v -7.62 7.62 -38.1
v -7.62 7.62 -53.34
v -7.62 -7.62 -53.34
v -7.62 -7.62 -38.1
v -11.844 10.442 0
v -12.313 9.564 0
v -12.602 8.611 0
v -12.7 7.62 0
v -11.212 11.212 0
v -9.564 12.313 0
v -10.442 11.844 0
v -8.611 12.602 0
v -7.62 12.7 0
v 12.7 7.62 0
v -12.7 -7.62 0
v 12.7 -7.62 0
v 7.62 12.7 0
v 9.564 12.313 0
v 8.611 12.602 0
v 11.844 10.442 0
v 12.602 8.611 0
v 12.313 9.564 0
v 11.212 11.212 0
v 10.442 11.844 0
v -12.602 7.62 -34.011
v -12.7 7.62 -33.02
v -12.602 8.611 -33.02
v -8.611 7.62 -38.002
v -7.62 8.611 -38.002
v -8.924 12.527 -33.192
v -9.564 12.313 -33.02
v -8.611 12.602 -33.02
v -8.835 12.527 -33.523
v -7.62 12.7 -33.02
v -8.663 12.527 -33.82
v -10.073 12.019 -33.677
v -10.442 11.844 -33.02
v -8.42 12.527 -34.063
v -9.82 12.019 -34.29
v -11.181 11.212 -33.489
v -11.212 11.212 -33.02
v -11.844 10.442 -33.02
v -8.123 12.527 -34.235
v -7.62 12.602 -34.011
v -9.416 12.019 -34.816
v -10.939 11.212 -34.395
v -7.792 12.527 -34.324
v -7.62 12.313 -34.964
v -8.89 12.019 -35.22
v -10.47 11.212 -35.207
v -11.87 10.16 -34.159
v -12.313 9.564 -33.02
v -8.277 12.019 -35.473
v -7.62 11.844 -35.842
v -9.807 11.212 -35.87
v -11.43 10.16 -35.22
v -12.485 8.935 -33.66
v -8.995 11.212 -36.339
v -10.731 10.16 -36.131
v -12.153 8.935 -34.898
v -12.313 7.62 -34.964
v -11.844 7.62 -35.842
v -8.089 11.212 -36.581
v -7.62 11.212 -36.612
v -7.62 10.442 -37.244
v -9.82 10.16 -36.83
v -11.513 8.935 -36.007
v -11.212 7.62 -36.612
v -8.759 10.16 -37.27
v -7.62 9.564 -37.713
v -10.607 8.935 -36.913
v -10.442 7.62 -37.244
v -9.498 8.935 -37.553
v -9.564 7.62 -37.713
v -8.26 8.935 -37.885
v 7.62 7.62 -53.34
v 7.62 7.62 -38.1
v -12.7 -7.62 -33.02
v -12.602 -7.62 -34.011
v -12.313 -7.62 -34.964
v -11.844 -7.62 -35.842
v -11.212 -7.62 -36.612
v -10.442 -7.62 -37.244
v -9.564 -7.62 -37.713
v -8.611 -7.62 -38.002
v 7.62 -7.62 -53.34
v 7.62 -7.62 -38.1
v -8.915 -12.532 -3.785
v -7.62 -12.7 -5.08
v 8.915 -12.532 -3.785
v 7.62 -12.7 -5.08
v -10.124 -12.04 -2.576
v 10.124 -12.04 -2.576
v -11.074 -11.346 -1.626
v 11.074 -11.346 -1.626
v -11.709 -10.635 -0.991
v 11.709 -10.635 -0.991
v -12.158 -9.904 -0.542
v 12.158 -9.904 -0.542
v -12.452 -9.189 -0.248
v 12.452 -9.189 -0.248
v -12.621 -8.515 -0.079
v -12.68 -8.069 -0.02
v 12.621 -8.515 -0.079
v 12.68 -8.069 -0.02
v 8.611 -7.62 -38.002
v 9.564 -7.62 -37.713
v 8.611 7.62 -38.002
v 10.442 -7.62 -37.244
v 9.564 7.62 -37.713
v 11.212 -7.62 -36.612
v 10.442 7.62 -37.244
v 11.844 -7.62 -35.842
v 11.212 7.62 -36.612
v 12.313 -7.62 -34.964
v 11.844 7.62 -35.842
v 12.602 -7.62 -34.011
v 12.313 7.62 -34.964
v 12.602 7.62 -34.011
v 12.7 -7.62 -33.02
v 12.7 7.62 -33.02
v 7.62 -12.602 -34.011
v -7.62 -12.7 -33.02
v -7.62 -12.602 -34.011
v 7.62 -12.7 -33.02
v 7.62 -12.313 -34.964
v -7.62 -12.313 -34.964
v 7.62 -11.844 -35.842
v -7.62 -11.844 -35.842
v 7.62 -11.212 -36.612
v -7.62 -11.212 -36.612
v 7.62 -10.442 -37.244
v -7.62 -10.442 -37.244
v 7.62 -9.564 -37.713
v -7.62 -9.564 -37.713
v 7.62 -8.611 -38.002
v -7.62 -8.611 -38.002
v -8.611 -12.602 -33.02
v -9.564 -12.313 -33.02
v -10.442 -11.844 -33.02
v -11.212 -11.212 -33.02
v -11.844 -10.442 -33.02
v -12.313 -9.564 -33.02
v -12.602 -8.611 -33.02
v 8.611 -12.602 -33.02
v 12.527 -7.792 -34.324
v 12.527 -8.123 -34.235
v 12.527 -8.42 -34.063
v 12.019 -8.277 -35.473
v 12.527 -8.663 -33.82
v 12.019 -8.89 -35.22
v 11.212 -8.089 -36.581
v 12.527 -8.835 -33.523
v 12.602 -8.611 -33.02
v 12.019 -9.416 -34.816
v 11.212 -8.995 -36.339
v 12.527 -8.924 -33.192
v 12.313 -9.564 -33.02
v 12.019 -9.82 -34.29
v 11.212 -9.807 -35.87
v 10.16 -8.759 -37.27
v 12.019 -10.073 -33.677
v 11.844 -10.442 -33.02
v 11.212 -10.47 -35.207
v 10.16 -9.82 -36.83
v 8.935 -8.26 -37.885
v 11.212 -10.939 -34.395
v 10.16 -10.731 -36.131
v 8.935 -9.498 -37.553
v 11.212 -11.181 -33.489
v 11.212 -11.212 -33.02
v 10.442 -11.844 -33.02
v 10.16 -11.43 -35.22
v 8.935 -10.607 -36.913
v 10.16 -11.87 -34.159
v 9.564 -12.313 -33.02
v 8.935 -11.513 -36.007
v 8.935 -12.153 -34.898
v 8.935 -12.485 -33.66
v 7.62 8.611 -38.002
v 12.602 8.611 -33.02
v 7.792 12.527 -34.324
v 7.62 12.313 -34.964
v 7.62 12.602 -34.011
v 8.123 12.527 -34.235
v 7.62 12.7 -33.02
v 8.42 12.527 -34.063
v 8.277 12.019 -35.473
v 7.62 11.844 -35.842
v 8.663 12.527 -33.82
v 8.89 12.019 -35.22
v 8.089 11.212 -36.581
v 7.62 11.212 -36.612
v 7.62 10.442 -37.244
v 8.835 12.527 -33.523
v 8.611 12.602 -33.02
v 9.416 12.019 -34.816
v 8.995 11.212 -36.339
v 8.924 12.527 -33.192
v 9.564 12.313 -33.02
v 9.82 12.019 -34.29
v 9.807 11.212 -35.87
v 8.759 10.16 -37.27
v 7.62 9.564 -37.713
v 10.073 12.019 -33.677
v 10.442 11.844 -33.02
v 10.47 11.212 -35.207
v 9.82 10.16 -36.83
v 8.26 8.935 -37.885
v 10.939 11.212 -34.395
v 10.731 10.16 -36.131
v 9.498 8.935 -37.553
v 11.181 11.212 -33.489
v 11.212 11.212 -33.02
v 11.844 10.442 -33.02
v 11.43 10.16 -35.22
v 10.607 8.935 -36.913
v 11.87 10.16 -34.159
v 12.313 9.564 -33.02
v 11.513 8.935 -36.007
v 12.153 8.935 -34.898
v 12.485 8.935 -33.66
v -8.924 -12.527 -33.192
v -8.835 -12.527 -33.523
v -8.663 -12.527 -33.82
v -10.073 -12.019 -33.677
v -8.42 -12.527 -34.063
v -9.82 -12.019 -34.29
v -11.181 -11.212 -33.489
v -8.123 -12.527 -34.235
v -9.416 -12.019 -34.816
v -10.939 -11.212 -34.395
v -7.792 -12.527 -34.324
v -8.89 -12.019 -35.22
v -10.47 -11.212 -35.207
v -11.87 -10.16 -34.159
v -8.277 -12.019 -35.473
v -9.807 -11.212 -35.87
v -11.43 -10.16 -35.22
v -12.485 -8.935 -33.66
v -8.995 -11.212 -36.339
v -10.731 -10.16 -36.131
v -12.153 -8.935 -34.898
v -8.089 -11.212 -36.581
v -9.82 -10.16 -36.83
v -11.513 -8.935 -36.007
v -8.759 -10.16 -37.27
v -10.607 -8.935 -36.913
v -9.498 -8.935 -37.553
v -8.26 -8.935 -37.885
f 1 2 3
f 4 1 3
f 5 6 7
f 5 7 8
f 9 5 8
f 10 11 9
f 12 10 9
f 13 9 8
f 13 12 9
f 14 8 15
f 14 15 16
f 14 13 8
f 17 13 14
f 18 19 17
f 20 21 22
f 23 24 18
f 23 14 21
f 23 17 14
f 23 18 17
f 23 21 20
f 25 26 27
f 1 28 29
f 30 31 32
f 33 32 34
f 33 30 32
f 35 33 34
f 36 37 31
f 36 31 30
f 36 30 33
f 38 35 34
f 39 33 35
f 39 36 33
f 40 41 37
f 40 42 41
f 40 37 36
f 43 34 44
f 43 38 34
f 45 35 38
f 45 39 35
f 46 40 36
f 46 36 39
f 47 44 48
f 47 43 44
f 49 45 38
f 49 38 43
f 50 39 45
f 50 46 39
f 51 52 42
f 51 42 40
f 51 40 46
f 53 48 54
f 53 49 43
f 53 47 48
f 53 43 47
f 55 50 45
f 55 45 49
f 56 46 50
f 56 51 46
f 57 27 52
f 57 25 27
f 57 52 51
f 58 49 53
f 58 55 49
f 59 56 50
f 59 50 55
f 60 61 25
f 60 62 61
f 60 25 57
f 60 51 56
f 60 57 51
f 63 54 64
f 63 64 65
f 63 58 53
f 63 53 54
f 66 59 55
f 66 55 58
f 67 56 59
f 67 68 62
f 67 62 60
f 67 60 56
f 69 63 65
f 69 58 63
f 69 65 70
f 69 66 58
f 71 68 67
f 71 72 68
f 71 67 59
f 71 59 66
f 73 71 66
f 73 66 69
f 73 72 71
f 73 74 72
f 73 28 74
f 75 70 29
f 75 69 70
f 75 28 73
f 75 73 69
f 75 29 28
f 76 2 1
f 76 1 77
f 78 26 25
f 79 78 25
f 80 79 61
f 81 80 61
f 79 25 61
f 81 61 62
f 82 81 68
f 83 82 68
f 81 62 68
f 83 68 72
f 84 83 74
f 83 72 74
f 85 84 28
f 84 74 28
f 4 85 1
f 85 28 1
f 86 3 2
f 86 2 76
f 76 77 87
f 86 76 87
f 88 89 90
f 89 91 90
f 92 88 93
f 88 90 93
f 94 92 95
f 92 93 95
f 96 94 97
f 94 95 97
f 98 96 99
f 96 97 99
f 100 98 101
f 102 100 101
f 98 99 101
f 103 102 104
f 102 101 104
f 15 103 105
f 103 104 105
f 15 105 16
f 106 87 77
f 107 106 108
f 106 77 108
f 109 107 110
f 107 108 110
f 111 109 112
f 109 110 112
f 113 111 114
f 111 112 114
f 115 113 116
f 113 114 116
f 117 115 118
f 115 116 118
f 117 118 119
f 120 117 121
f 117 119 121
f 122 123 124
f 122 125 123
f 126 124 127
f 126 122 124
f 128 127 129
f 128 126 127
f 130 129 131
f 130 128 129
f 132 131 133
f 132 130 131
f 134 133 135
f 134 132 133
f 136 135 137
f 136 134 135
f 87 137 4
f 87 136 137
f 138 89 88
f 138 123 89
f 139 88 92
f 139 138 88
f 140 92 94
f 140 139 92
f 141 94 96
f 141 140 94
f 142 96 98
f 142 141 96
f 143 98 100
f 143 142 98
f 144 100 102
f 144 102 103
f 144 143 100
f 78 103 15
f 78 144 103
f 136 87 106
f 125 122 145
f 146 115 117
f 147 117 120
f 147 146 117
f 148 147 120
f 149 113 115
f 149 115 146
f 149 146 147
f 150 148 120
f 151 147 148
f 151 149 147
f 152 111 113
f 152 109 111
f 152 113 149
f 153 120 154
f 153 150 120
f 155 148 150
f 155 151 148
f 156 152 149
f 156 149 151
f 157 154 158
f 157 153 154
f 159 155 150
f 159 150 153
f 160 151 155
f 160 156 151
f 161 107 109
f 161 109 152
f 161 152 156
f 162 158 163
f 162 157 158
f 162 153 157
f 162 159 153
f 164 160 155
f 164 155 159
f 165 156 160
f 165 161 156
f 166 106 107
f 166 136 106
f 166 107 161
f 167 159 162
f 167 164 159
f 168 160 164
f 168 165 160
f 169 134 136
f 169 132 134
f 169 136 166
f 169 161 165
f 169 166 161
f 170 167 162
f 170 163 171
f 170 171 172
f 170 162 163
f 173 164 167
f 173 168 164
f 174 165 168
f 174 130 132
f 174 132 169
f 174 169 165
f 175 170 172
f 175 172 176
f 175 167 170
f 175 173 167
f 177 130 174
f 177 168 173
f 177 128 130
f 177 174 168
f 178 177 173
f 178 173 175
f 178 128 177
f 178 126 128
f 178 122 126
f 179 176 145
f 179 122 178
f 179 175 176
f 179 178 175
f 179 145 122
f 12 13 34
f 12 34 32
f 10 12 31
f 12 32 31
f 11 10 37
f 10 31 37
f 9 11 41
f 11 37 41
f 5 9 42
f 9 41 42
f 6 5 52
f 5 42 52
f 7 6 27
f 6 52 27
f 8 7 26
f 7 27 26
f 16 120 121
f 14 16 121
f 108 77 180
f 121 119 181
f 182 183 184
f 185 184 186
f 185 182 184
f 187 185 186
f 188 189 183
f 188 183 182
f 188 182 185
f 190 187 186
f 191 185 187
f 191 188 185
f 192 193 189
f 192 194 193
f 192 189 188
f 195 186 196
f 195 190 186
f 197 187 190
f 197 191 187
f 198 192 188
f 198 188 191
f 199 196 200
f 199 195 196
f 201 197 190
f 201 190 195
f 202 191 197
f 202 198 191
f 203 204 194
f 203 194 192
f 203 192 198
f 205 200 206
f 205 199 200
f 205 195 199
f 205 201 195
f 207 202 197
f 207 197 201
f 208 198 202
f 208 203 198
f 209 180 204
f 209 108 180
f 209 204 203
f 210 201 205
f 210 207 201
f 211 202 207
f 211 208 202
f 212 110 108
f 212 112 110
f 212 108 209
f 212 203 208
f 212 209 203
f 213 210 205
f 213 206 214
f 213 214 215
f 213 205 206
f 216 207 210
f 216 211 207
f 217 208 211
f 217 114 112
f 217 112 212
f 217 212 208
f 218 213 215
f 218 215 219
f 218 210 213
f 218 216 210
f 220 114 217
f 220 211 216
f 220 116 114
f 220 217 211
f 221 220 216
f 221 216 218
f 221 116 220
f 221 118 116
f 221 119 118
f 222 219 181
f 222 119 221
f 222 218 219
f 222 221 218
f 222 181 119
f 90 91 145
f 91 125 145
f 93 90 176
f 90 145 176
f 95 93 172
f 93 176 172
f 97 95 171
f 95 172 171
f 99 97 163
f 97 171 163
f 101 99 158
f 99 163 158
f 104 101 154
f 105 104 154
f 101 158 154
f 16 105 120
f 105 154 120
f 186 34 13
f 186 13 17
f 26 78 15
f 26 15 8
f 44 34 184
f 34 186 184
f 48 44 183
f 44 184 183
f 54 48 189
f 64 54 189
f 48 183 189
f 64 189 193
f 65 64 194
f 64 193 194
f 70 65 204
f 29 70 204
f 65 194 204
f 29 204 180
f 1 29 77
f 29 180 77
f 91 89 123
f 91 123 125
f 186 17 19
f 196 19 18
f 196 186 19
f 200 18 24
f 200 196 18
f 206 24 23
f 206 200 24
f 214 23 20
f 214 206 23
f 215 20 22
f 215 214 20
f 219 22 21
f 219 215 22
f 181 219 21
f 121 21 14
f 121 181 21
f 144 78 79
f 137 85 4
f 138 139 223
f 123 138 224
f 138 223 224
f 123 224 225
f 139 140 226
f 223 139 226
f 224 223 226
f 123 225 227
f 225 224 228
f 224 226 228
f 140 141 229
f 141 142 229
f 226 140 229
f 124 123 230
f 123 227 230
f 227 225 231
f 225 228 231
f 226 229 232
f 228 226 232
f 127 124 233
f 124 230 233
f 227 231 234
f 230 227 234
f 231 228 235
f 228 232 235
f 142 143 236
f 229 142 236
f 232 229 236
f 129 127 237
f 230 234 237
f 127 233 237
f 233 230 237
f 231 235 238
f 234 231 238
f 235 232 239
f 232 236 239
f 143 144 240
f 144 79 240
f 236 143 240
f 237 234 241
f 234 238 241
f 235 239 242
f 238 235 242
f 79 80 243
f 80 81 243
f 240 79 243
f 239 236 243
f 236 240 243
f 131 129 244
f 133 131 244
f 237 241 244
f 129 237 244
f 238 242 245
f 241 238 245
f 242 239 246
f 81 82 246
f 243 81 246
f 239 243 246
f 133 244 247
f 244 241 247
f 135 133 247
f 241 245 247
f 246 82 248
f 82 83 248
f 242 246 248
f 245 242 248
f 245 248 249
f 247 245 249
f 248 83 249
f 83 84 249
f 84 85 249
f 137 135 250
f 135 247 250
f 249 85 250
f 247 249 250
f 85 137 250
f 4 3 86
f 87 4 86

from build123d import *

# Parameters (mm, degrees)
F0_W      = 25.4
F0_H      = 25.4
F1_DEPTH  = 38.1
F2_R      = 5.08
F3_R      = 5.08
F1_FACE_W = 15.24
F1_FACE_H = 15.24
F4_DEPTH  = 15.24


with BuildPart() as f1:
    # F0 (on Top) → F1 (new body)
    with BuildSketch(Plane.XY):
        Rectangle(F0_W, F0_H)
    extrude(amount=-F1_DEPTH)

    # F2
    f2_edges = [f1.edges().sort_by_distance(p)[0] for p in [
        (-12.7, 0, -38.1),
    ]]
    fillet(f2_edges, radius=F2_R)

    # F3
    f3_edges = [f1.edges().sort_by_distance(p)[0] for p in [
        (2.54, -12.7, -38.1),
        (-7.62, 0, -38.1),
        (12.7, 0, -38.1),
        (2.54, 12.7, -38.1),
        (-12.7, -12.7, -16.51),
        (-11.212102, -12.7, -36.612102),
        (0, -12.7, 0),
        (12.7, -12.7, -19.05),
        (12.7, 12.7, -19.05),
    ]]
    fillet(f3_edges, radius=F3_R)

    # F1_face (on face) → F4 (join)
    with BuildSketch(Plane(origin=(0, 0, -38.1), x_dir=(1, 0, 0), z_dir=(0, 0, -1))):
        Rectangle(F1_FACE_W, F1_FACE_H)
    extrude(amount=F4_DEPTH)


solid = f1.part
